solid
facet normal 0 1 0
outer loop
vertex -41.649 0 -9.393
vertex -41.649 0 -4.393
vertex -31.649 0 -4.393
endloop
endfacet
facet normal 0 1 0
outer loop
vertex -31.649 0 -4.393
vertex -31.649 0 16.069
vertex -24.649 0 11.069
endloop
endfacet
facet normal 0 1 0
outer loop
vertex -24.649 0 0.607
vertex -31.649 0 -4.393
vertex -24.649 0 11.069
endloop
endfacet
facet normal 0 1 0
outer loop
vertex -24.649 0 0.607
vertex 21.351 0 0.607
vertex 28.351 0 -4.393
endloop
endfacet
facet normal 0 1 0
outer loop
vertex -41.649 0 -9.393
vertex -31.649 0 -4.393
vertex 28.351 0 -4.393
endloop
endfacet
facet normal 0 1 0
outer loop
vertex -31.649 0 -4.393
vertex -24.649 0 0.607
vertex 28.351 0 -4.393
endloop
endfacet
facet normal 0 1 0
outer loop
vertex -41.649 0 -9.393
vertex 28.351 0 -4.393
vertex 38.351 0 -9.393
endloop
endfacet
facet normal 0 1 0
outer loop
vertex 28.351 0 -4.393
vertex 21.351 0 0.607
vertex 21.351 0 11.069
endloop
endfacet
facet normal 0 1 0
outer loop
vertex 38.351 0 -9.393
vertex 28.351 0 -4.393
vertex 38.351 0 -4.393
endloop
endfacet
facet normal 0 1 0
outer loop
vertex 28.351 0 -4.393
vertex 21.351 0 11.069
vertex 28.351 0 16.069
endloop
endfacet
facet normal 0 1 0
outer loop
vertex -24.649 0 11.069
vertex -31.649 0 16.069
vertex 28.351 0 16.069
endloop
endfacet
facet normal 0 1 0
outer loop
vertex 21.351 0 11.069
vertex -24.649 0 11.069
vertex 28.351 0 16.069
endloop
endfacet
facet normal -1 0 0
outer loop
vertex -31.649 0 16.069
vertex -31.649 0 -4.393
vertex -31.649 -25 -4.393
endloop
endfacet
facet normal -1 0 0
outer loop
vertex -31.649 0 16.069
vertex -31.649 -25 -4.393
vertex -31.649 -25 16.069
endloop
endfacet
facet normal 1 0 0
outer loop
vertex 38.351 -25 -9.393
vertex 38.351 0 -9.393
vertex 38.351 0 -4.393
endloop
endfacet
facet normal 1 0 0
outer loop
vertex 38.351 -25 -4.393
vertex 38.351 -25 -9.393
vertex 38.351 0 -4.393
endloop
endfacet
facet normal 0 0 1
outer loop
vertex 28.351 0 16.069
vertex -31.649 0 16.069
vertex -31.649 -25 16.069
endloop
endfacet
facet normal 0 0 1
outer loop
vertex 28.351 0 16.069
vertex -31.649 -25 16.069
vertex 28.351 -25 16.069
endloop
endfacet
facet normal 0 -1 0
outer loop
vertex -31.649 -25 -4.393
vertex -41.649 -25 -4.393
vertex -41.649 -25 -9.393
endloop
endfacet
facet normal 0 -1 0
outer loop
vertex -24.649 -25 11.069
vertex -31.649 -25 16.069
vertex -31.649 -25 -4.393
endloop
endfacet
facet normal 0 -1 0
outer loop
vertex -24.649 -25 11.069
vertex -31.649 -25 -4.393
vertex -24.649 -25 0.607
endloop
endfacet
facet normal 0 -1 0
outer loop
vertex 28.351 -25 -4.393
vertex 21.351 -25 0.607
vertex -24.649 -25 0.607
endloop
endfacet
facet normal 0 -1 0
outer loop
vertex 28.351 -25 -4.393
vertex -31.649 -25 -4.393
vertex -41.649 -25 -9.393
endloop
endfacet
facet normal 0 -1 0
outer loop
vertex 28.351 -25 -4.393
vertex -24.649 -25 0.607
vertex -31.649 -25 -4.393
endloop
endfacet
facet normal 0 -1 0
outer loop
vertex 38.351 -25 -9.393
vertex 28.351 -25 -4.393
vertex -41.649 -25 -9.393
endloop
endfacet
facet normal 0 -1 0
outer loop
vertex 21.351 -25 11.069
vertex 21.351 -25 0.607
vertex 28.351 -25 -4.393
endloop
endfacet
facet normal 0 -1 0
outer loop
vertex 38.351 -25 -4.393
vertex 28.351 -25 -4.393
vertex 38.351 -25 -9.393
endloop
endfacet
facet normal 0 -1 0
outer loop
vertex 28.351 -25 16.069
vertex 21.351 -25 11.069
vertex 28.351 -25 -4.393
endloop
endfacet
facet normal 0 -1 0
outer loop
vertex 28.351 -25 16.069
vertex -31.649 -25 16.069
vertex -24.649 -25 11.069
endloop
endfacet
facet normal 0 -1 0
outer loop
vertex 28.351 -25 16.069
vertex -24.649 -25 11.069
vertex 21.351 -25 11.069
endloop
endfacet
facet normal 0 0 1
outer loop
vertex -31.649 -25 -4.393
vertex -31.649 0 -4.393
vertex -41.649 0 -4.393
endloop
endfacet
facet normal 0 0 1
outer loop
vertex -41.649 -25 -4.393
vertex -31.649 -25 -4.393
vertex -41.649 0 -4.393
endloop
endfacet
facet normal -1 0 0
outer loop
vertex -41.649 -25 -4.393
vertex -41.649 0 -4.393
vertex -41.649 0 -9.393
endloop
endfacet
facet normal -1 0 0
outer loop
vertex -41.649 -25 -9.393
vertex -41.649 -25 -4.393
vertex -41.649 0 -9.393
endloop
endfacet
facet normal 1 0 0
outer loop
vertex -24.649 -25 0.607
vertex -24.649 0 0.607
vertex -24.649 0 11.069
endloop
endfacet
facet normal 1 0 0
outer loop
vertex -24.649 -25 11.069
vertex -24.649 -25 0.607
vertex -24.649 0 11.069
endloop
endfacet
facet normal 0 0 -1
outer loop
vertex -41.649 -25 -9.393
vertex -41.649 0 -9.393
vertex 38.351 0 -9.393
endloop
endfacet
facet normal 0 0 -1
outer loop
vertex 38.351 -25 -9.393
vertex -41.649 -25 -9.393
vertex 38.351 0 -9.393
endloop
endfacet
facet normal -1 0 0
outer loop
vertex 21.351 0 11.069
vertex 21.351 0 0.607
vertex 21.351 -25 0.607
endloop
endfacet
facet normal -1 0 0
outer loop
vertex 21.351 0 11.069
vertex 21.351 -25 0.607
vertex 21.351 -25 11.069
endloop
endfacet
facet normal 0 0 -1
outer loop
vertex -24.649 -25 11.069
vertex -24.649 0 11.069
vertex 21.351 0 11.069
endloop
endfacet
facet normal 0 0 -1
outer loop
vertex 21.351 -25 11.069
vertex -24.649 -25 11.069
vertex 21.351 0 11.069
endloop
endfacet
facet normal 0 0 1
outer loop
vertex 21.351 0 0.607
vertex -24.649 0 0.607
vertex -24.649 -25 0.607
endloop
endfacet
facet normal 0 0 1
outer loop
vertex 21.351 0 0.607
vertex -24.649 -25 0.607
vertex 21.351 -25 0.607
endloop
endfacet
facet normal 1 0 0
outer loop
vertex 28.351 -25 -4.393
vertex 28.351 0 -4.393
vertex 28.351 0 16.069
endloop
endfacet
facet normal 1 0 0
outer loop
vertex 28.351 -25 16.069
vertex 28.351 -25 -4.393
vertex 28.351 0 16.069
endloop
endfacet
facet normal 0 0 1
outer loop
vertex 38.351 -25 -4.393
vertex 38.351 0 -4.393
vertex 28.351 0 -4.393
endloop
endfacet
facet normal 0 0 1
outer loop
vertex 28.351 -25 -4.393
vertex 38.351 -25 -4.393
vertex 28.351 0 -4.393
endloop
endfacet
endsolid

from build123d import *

# Parameters (mm, degrees)
F0_W     = 60
F0_H     = 20.4615421835
F0_W_2   = 46
F0_H_2   = 10.4615421835
F1_DEPTH = 25


with BuildPart() as f1:
    # F0 (on Front) → F1 (new body)
    with BuildSketch(Plane.XZ):
        with Locations((-1.6490174871, 5.8380284264)):
            Rectangle(F0_W, F0_H)
        with Locations((-1.6490174871, 5.8380284264)):
            Rectangle(F0_W_2, F0_H_2, mode=Mode.SUBTRACT)
        Polygon((28.3509825129, -4.3927426653), (-31.6490174871, -4.3927426653), (-41.6490174871, -4.3927426653), (-41.6490174871, -9.3927426653), (38.3509825129, -9.3927426653), (38.3509825129, -4.3927426653), align=None)
    extrude(amount=F1_DEPTH)


solid = f1.part
